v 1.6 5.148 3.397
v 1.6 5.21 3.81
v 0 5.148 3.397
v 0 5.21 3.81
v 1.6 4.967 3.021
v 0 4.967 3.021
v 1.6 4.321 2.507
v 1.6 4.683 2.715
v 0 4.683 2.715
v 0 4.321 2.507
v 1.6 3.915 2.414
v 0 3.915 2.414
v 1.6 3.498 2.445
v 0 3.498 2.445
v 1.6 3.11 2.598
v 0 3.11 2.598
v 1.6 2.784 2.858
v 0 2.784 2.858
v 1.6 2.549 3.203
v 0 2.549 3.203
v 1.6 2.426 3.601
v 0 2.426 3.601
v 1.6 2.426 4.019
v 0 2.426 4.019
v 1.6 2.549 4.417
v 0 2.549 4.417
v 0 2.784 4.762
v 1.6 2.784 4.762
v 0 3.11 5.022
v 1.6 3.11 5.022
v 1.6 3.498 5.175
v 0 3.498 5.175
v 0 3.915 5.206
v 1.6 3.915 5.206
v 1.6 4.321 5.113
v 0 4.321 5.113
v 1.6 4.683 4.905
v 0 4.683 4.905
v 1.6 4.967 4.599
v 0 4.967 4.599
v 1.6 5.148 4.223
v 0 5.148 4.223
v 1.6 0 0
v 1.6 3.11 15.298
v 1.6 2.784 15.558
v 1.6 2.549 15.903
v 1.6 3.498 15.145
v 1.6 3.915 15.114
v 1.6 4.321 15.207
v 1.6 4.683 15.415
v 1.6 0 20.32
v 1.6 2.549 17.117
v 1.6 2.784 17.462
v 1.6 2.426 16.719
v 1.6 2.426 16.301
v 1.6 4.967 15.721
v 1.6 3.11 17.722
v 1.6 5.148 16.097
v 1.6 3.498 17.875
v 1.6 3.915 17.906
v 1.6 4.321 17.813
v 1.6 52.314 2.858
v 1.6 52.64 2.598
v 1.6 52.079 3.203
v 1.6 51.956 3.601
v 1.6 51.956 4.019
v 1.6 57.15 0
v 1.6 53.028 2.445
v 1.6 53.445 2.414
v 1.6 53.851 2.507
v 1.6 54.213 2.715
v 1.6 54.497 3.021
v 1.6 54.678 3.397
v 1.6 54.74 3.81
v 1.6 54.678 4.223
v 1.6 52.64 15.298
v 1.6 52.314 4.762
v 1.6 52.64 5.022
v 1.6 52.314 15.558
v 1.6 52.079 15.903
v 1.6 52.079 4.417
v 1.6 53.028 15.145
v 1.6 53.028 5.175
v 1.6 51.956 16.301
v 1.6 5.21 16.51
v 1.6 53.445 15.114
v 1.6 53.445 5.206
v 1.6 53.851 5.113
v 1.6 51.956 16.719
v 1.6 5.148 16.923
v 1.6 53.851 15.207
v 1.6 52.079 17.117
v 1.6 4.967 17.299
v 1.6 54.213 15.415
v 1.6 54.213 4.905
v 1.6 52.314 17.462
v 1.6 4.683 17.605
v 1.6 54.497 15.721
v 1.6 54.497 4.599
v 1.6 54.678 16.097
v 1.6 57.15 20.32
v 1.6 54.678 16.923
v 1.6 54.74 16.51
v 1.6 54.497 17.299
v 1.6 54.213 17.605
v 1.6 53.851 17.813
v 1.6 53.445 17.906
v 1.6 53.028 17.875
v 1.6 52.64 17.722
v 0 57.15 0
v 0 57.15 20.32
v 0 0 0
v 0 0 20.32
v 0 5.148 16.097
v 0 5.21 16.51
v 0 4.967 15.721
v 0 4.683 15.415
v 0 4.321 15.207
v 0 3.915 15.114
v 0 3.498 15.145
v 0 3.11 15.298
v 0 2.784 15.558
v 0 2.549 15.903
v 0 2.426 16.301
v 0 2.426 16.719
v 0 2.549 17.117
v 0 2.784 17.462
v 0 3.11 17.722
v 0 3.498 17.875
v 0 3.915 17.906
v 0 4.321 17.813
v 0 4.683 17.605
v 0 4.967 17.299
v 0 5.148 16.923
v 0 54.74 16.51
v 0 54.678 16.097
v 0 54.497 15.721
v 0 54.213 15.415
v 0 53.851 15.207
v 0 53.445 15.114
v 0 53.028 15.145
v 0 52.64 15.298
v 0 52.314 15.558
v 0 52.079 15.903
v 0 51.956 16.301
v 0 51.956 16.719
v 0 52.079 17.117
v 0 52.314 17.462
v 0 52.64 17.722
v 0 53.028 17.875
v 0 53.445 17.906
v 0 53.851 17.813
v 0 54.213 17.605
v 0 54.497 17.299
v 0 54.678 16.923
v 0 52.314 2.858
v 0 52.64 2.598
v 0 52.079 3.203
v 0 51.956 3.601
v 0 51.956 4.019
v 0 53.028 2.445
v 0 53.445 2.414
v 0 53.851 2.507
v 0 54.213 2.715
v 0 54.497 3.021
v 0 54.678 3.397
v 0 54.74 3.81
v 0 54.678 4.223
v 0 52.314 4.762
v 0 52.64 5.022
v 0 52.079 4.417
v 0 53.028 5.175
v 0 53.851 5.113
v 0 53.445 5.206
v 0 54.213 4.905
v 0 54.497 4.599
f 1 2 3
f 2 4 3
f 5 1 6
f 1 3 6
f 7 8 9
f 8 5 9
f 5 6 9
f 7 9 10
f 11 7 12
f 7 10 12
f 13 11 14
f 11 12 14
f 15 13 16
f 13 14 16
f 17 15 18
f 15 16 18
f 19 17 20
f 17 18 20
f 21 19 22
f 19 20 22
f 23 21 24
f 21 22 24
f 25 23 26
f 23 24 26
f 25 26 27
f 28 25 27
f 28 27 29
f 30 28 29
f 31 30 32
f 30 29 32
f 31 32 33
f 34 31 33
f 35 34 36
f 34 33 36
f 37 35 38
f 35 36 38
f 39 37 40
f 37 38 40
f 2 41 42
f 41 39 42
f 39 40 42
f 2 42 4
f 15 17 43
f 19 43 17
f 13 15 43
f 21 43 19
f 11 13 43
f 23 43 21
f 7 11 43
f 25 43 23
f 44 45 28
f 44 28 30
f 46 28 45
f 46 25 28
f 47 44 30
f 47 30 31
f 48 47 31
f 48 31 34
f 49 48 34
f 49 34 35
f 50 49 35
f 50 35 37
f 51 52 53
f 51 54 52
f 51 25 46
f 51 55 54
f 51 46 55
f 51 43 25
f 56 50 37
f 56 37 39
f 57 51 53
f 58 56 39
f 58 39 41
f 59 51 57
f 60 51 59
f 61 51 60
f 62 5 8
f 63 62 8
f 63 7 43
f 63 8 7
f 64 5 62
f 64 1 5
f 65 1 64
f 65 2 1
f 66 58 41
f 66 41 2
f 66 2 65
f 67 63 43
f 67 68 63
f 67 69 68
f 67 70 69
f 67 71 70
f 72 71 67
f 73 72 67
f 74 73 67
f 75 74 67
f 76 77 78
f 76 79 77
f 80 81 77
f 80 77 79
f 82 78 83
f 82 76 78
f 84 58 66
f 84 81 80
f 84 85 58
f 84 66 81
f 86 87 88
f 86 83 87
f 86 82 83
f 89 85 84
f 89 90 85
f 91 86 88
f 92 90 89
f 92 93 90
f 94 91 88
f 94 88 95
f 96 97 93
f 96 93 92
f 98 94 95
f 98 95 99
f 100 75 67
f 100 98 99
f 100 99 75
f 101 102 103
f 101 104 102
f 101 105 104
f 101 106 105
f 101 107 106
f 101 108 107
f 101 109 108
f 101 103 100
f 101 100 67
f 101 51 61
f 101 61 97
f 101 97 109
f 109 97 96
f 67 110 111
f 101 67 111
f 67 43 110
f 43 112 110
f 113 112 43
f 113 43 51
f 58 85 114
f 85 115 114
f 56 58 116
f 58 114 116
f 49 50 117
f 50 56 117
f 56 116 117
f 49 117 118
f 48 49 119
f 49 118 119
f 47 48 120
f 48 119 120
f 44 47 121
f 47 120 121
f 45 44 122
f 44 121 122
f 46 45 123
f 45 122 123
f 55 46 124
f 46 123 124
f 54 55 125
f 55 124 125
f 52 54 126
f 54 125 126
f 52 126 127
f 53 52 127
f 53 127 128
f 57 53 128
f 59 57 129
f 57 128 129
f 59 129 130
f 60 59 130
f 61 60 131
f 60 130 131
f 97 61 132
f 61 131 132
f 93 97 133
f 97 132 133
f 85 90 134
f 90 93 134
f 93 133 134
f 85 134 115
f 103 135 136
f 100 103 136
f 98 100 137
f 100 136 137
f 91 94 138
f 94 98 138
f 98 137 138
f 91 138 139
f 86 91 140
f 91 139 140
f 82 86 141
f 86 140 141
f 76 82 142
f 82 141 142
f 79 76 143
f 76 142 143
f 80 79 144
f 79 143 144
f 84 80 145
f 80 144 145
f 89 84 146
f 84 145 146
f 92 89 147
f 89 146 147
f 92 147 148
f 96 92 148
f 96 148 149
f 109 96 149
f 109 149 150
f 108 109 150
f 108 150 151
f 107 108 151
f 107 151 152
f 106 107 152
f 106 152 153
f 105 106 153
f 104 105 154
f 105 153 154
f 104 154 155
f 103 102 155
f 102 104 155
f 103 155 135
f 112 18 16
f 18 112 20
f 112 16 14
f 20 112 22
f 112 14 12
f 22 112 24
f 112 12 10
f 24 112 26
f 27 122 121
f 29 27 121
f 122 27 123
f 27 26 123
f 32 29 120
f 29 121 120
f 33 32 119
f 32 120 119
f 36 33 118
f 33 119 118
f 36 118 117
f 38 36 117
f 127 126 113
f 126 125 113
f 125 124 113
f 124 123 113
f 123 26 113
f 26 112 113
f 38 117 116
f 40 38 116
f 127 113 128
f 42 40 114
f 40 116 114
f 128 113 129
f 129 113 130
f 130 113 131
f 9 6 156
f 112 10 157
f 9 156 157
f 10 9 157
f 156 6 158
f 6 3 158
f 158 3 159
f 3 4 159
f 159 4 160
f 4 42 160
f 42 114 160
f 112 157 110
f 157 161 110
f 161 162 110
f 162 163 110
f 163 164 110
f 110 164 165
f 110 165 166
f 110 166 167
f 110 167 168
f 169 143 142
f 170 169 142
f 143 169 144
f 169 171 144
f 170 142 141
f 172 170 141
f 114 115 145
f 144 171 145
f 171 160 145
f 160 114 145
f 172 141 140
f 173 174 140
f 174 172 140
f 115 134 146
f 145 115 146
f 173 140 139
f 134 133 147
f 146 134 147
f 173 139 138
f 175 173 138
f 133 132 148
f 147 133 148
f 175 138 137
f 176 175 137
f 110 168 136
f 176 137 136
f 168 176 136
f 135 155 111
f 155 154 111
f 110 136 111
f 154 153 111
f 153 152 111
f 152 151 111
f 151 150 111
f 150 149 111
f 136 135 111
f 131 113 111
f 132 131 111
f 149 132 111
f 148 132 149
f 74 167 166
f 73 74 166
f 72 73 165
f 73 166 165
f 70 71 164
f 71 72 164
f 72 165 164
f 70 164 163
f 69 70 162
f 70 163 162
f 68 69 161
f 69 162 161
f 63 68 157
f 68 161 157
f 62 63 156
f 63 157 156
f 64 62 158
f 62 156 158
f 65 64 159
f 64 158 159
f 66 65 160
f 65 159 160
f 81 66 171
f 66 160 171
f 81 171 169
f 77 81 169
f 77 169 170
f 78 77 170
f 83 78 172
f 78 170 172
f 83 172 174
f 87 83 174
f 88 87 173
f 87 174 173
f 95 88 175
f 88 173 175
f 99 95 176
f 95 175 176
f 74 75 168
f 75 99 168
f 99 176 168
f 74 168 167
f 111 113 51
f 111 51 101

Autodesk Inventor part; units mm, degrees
ref_plane "YZ Plane" through (0, 0, 0) normal (1, 0, 0) x (0, 1, 0)
ref_plane "XZ Plane" through (0, 0, 0) normal (0, 1, 0) x (-1, 0, 0)
ref_plane "XY Plane" through (0, 0, 0) normal (0, 0, 1) x (1, 0, 0)
sketch "Sketch1" plane through (0, 0, 0) normal (1, 0, 0) x (0, 1, 0)
  line L0 (0, 0) -> (57.15, 0)
  line L1 (57.15, 0) -> (57.15, 20.32)
  line L2 (0, 0) -> (0, 20.32)
  line L3 (28.575, 0) -> (28.575, 8.5438) construction
  circle A0 centre (3.81, 3.81) radius 1.4
  circle A1 centre (53.34, 3.81) radius 1.4
  circle A2 centre (53.34, 16.51) radius 1.4
  circle A3 centre (3.81, 16.51) radius 1.4
  line L4 (0, 20.32) -> (57.15, 20.32)
  dimension "d0" = 57.15
  dimension "d1" = 20.32
  dimension "d2" = 20.32
  dimension "d5" = 2.8
  dimension "d6" = 3.81
  dimension "d7" = 3.81
  dimension "d14" = 2.8
  dimension "d15" = 12.7
  dimension "d18" = 49.53
extrude "Extrusion1" add sketch "Sketch1" along normal blind 1.6
properties part number "PCBModuleLeft02" material "PCB(1)"
